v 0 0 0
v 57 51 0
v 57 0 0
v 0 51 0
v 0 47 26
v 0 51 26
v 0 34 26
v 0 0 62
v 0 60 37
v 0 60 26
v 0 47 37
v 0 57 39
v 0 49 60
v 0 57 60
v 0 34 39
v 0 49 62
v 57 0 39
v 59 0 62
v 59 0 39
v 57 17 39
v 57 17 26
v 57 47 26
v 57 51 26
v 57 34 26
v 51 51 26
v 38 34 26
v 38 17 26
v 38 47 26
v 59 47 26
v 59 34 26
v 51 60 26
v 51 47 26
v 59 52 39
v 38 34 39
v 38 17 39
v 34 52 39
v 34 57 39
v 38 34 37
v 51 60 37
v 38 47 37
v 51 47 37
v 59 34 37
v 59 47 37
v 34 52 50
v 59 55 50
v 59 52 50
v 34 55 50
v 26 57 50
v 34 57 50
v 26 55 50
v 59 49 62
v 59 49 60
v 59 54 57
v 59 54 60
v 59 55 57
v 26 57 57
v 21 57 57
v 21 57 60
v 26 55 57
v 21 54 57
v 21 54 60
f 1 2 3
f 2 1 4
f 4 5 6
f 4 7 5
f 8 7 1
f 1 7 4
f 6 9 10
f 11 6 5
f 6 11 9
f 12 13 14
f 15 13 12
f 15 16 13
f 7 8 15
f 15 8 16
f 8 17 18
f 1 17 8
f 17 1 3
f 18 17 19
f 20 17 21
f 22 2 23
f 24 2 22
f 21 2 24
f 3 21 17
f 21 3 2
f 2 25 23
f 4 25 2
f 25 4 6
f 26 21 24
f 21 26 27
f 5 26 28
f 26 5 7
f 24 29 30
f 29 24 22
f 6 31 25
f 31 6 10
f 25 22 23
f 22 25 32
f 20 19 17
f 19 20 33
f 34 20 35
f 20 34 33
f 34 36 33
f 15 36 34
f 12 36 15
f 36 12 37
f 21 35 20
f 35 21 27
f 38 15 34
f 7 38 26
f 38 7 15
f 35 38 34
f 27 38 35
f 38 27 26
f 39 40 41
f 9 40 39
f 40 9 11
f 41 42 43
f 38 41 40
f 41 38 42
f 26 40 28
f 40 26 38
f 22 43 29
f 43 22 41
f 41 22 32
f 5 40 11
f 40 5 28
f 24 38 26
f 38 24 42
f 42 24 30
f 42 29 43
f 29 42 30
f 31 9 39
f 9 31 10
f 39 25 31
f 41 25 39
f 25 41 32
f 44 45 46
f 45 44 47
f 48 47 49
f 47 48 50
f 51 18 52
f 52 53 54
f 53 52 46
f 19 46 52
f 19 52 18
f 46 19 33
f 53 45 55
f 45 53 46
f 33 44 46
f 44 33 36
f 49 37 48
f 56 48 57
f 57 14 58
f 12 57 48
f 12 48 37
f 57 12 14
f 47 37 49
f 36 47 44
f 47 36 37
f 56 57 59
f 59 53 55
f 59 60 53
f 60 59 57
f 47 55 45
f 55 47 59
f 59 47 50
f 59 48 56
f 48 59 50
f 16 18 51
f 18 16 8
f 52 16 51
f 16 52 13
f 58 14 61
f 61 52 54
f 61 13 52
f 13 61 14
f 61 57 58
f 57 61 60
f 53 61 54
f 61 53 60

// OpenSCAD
translate([9.5, 8.5, 6.5]) color([0.5739818030823766, 0.6271396891048426, 0.5313758038379728]) cube([19, 17, 13], center=true);
translate([28.5, 8.5, 6.5]) color([0.4108045023355995, 0.634594012376466, 0.40341287658681757]) cube([19, 17, 13], center=true);
translate([47.5, 8.5, 6.5]) color([0.7785502590540477, 0.7881774252549901, 0.29225416811082217]) cube([19, 17, 13], center=true);
translate([9.5, 25.5, 6.5]) color([0.37180432355577453, 0.6288109059468862, 0.15706996711565713]) cube([19, 17, 13], center=true);
translate([28.5, 25.5, 6.5]) color([0.6970319309869248, 0.3814277529807131, 0.591062474757007]) cube([19, 17, 13], center=true);
translate([47.5, 25.5, 6.5]) color([0.1395330992312218, 0.6682583860975598, 0.3540578606136997]) cube([19, 17, 13], center=true);
translate([9.5, 42.5, 6.5]) color([0.4726655762072315, 0.4151074008495357, 0.47671524799509457]) cube([19, 17, 13], center=true);
translate([28.5, 42.5, 6.5]) color([0.6946956329164442, 0.31824017683207795, 0.6520544808985483]) cube([19, 17, 13], center=true);
translate([47.5, 42.5, 6.5]) color([0.060222107499701916, 0.3001851524622099, 0.7452096901500458]) cube([19, 17, 13], center=true);
translate([9.5, 8.5, 19.5]) color([0.05240587806206365, 0.6211421952822352, 0.025546799267838538]) cube([19, 17, 13], center=true);
translate([28.5, 8.5, 19.5]) color([0.4715288683099005, 0.8885450437134765, 0.010110093997603875]) cube([19, 17, 13], center=true);
translate([47.5, 8.5, 19.5]) color([0.5268280206539229, 0.06645682965886301, 0.8671097761494883]) cube([19, 17, 13], center=true);
translate([9.5, 25.5, 19.5]) color([0.6862965222396646, 0.7419538566814291, 0.669007579945888]) cube([19, 17, 13], center=true);
translate([28.5, 25.5, 19.5]) color([0.006423453698145676, 0.041177862257898545, 0.6208768040220466]) cube([19, 17, 13], center=true);
translate([47.5, 25.5, 19.5]) color([0.9996851255769114, 0.8731472390917929, 0.699685806725371]) cube([19, 17, 13], center=true);
translate([9.5, 42.5, 19.5]) color([0.7270999543422898, 0.2266870226016624, 0.751613934135812]) cube([19, 17, 13], center=true);
translate([28.5, 42.5, 19.5]) color([0.28792410486343756, 0.10546026702239297, 0.4608948954667579]) cube([19, 17, 13], center=true);
translate([47.5, 42.5, 19.5]) color([0.33019577252961807, 0.168255398651179, 0.42170989251140467]) cube([19, 17, 13], center=true);
translate([9.5, 8.5, 32.5]) color([0.8972009769638755, 0.4352702732981688, 0.4472918952497248]) cube([19, 17, 13], center=true);
translate([28.5, 8.5, 32.5]) color([0.708827757444238, 0.5241618701522923, 0.12922303534199353]) cube([19, 17, 13], center=true);
translate([47.5, 8.5, 32.5]) color([0.91039239754397, 0.4441243361619651, 0.7893377392253591]) cube([19, 17, 13], center=true);
translate([9.5, 25.5, 32.5]) color([0.38887513002224416, 0.806846018820692, 0.3895364160074527]) cube([19, 17, 13], center=true);
translate([28.5, 25.5, 32.5]) color([0.2201595216660458, 0.19619466691666865, 0.9400346443375104]) cube([19, 17, 13], center=true);
translate([46.5, 40.5, 31.5]) color([0.58653025858102, 0.04979326505826487, 0.38834759617804915]) cube([17, 13, 11], center=true);
translate([57.0, 40.5, 31.5]) color([0.234029260524927, 0.08465706460929934, 0.18675586852140846]) cube([4, 13, 11], center=true);
translate([8.5, 53.5, 31.5]) color([0.05699047999950346, 0.6380736282281027, 0.17337386483746886]) cube([17, 13, 11], center=true);
translate([25.5, 53.5, 31.5]) color([0.6107798762435255, 0.6125067478912297, 0.7049237107399368]) cube([17, 13, 11], center=true);
translate([42.5, 53.5, 31.5]) color([0.5121186506114312, 0.28442399033479826, 0.8774574539285279]) cube([17, 13, 11], center=true);
translate([8.5, 6.5, 44.5]) color([0.35307108172351365, 0.4582943249787391, 0.6318794317305464]) cube([17, 13, 11], center=true);
translate([25.5, 6.5, 44.5]) color([0.5161242981674495, 0.9564683485665337, 0.9547176774381221]) cube([17, 13, 11], center=true);
translate([42.5, 6.5, 44.5]) color([0.9297598506094263, 0.9340763496652581, 0.580960135568696]) cube([17, 13, 11], center=true);
translate([55.0, 6.5, 44.5]) color([0.49020206373000297, 0.7041168173823689, 0.21541959298546798]) cube([8, 13, 11], center=true);
translate([8.5, 19.5, 44.5]) color([0.26587203921552827, 0.04380725363309168, 0.16285754255803098]) cube([17, 13, 11], center=true);
translate([25.5, 19.5, 44.5]) color([0.0038745499388105342, 0.6546275765234981, 0.14040698903568194]) cube([17, 13, 11], center=true);
translate([42.5, 19.5, 44.5]) color([0.7866793455760521, 0.680503995881725, 0.9706757933544957]) cube([17, 13, 11], center=true);
translate([55.0, 19.5, 44.5]) color([0.3965144869518913, 0.9213919134510528, 0.4537041723195332]) cube([8, 13, 11], center=true);
translate([8.5, 32.5, 44.5]) color([0.3395037398362071, 0.10233886991705377, 0.8828321850718597]) cube([17, 13, 11], center=true);
translate([25.5, 32.5, 44.5]) color([0.7947901585625868, 0.3229289765350606, 0.45574438492562896]) cube([17, 13, 11], center=true);
translate([42.5, 32.5, 44.5]) color([0.32514346581324827, 0.028829116538094723, 0.04435252539911694]) cube([17, 13, 11], center=true);
translate([55.0, 32.5, 44.5]) color([0.3687041258820589, 0.20959132812878367, 0.5245146032105923]) cube([8, 13, 11], center=true);
translate([8.5, 45.5, 44.5]) color([0.1877850356496189, 0.2016215864664097, 0.6726678813176303]) cube([17, 13, 11], center=true);
translate([25.5, 45.5, 44.5]) color([0.7356026567617159, 0.31223209587410494, 0.8599943994333726]) cube([17, 13, 11], center=true);
translate([42.5, 45.5, 44.5]) color([0.2546391746557106, 0.34394037628155716, 0.712480390369609]) cube([17, 13, 11], center=true);
translate([55.0, 45.5, 44.5]) color([0.04450290132920964, 0.934183460116191, 0.07233773178762537]) cube([8, 13, 11], center=true);
translate([8.5, 54.5, 44.5]) color([0.4609310589380602, 0.7246048259600892, 0.04746853498479808]) cube([17, 5, 11], center=true);
translate([25.5, 54.5, 44.5]) color([0.8090026856371774, 0.9788933433114139, 0.460511672795628]) cube([17, 5, 11], center=true);
translate([6.5, 5.5, 53.5]) color([0.11812363628756806, 0.08147699565547994, 0.09873043616313526]) cube([13, 11, 7], center=true);
translate([19.5, 5.5, 53.5]) color([0.7654413741364753, 0.4140128484685186, 0.9192341581990311]) cube([13, 11, 7], center=true);
translate([32.5, 5.5, 53.5]) color([0.4406397760864845, 0.07714331014460807, 0.42693558751800065]) cube([13, 11, 7], center=true);
translate([45.5, 5.5, 53.5]) color([0.7548278934255565, 0.8293384268467949, 0.039351686529191854]) cube([13, 11, 7], center=true);
translate([55.5, 5.5, 53.5]) color([0.1803893912563338, 0.490013452023644, 0.12808547795160863]) cube([7, 11, 7], center=true);
translate([6.5, 16.5, 53.5]) color([0.8710926419421733, 0.9344608884461488, 0.3195969983538176]) cube([13, 11, 7], center=true);
translate([19.5, 16.5, 53.5]) color([0.43484368255202, 0.5570540644200566, 0.2855057910835891]) cube([13, 11, 7], center=true);
translate([32.5, 16.5, 53.5]) color([0.5410756974595614, 0.2011850454737838, 0.2966412512769129]) cube([13, 11, 7], center=true);
translate([45.5, 16.5, 53.5]) color([0.44178363318767744, 0.604669902191143, 0.5361650260862432]) cube([13, 11, 7], center=true);
translate([55.5, 16.5, 53.5]) color([0.2609879767339395, 0.23178787541805523, 0.11873023670071103]) cube([7, 11, 7], center=true);
translate([6.5, 27.5, 53.5]) color([0.7834936358921726, 0.09890076646638046, 0.7328850061793606]) cube([13, 11, 7], center=true);
translate([19.5, 27.5, 53.5]) color([0.2487736956630997, 0.28455698400578255, 0.7360834330107994]) cube([13, 11, 7], center=true);
translate([32.5, 27.5, 53.5]) color([0.6596207917216363, 0.7419215555155583, 0.5152830587943614]) cube([13, 11, 7], center=true);
translate([45.5, 27.5, 53.5]) color([0.8590958196652707, 0.12179389137547159, 0.6451969614065052]) cube([13, 11, 7], center=true);
translate([55.5, 27.5, 53.5]) color([0.11824431248865597, 0.7372833681454282, 0.3589046614584527]) cube([7, 11, 7], center=true);
translate([6.5, 38.5, 53.5]) color([0.67488210437111, 0.7034839134412817, 0.6606084576410584]) cube([13, 11, 7], center=true);
translate([19.5, 38.5, 53.5]) color([0.22155798032782648, 0.8317998863873537, 0.24013608742346748]) cube([13, 11, 7], center=true);
translate([32.5, 38.5, 53.5]) color([0.5181532972121122, 0.6746457541533513, 0.23360317478475656]) cube([13, 11, 7], center=true);
translate([45.5, 38.5, 53.5]) color([0.628511722983939, 0.2868310479973286, 0.1713823760843869]) cube([13, 11, 7], center=true);
translate([55.5, 38.5, 53.5]) color([0.809748828526577, 0.5531227700773604, 0.32788470660885605]) cube([7, 11, 7], center=true);
translate([6.5, 49.5, 53.5]) color([0.5854309472055399, 0.025286397427288332, 0.12982285676032723]) cube([13, 11, 7], center=true);
translate([19.5, 49.5, 53.5]) color([0.3955808516982431, 0.9757565794644123, 0.5104745178761232]) cube([13, 11, 7], center=true);
translate([32.5, 49.5, 53.5]) color([0.07645620506689521, 0.7650406152494567, 0.7814438709253152]) cube([13, 11, 7], center=true);
translate([45.5, 49.5, 53.5]) color([0.7748021743948562, 0.5694980380479538, 0.6956987378694627]) cube([13, 11, 7], center=true);
translate([55.5, 49.5, 53.5]) color([0.21345793631163135, 0.7325605908939883, 0.8161739873415944]) cube([7, 11, 7], center=true);
translate([6.5, 56.0, 53.5]) color([0.7599665402219192, 0.353462402585887, 0.5910280505757086]) cube([13, 2, 7], center=true);
translate([19.5, 56.0, 53.5]) color([0.6289893574898388, 0.9008098536570839, 0.1080138952733335]) cube([13, 2, 7], center=true);
translate([5.5, 3.5, 59.5]) color([0.8339337708504084, 0.5264355584690392, 0.3586141205519373]) cube([11, 7, 5], center=true);
translate([16.5, 3.5, 59.5]) color([0.4556029014937524, 0.012635498930738787, 0.22007359233142765]) cube([11, 7, 5], center=true);
translate([27.5, 3.5, 59.5]) color([0.6527634200680049, 0.660849279754449, 0.4946989402863131]) cube([11, 7, 5], center=true);
translate([38.5, 3.5, 59.5]) color([0.9533258805973196, 0.4809150885494712, 0.3139436595456605]) cube([11, 7, 5], center=true);
translate([49.5, 3.5, 59.5]) color([0.8477808391956414, 0.259158299397262, 0.6043059930343495]) cube([11, 7, 5], center=true);
translate([57.0, 3.5, 59.5]) color([0.7034188523223, 0.8216962986917842, 0.7853687501827489]) cube([4, 7, 5], center=true);
translate([5.5, 10.5, 59.5]) color([0.3840923305137113, 0.059180305962736934, 0.03828786548344276]) cube([11, 7, 5], center=true);
translate([16.5, 10.5, 59.5]) color([0.7264603879084595, 0.9616913814068508, 0.3431653742712939]) cube([11, 7, 5], center=true);
translate([27.5, 10.5, 59.5]) color([0.44119509807551416, 0.7257980157417766, 0.6578312458538799]) cube([11, 7, 5], center=true);
translate([38.5, 10.5, 59.5]) color([0.26010658848413604, 0.6715848457987025, 0.3049024195743838]) cube([11, 7, 5], center=true);
translate([49.5, 10.5, 59.5]) color([0.3563579065620385, 0.5395133052630944, 0.7323138239267305]) cube([11, 7, 5], center=true);
translate([57.0, 10.5, 59.5]) color([0.15121621156796483, 0.021987210892938758, 0.6278299544850219]) cube([4, 7, 5], center=true);
translate([5.5, 17.5, 59.5]) color([0.024564677785836264, 0.04496324071616853, 0.22577557672213355]) cube([11, 7, 5], center=true);
translate([16.5, 17.5, 59.5]) color([0.6538768733044555, 0.06654509768602879, 0.06240576762652772]) cube([11, 7, 5], center=true);
translate([27.5, 17.5, 59.5]) color([0.9720932443736168, 0.4226528937805498, 0.8924289339928592]) cube([11, 7, 5], center=true);
translate([38.5, 17.5, 59.5]) color([0.21652428395276402, 0.4352131794546169, 0.35803513461315506]) cube([11, 7, 5], center=true);
translate([49.5, 17.5, 59.5]) color([0.17693553603496914, 0.32881318575191665, 0.9867958186960467]) cube([11, 7, 5], center=true);
translate([57.0, 17.5, 59.5]) color([0.7473090097951195, 0.3826682791831585, 0.40928443439993156]) cube([4, 7, 5], center=true);
translate([5.5, 24.5, 59.5]) color([0.2637409011550663, 0.531336678598825, 0.7356369121419466]) cube([11, 7, 5], center=true);
translate([16.5, 24.5, 59.5]) color([0.686646615750601, 0.46264983534131954, 0.041939046716157]) cube([11, 7, 5], center=true);
translate([27.5, 24.5, 59.5]) color([0.9215078064992686, 0.4089338030960661, 0.3902988670119316]) cube([11, 7, 5], center=true);
translate([38.5, 24.5, 59.5]) color([0.0031101144891549914, 0.13822721408191307, 0.8688534175006787]) cube([11, 7, 5], center=true);
translate([49.5, 24.5, 59.5]) color([0.513934596181303, 0.7324348442226767, 0.14816788643335854]) cube([11, 7, 5], center=true);
translate([57.0, 24.5, 59.5]) color([0.33005100665524945, 0.8401365565378639, 0.8206585211774247]) cube([4, 7, 5], center=true);
translate([5.5, 31.5, 59.5]) color([0.2467942680862406, 0.021975308333072263, 0.8064669735456029]) cube([11, 7, 5], center=true);
translate([16.5, 31.5, 59.5]) color([0.16884400503942165, 0.7876813921208954, 0.6836592298851071]) cube([11, 7, 5], center=true);
translate([27.5, 31.5, 59.5]) color([0.1683147603108942, 0.0784886436699127, 0.9276494299222889]) cube([11, 7, 5], center=true);
translate([38.5, 31.5, 59.5]) color([0.5978783972833935, 0.620510173056511, 0.4575118028380537]) cube([11, 7, 5], center=true);
translate([49.5, 31.5, 59.5]) color([0.15007097732228858, 0.6019699129465877, 0.2524728800375037]) cube([11, 7, 5], center=true);
translate([57.0, 31.5, 59.5]) color([0.8058946560175415, 0.732718954805416, 0.027267185045511733]) cube([4, 7, 5], center=true);
translate([5.5, 38.5, 59.5]) color([0.9324230096450348, 0.03631604832667812, 0.0896193188307074]) cube([11, 7, 5], center=true);
translate([16.5, 38.5, 59.5]) color([0.2927345609042453, 0.1508090604701401, 0.2361450829166024]) cube([11, 7, 5], center=true);
translate([27.5, 38.5, 59.5]) color([0.3558094886115547, 0.7354997154547138, 0.4047113607648444]) cube([11, 7, 5], center=true);
translate([38.5, 38.5, 59.5]) color([0.2698397547254259, 0.4923131536276696, 0.39259324978876053]) cube([11, 7, 5], center=true);
translate([49.5, 38.5, 59.5]) color([0.310764197486207, 0.900541657866744, 0.5504484509596044]) cube([11, 7, 5], center=true);
translate([57.0, 38.5, 59.5]) color([0.9773275109747672, 0.7729124093934382, 0.570499297619577]) cube([4, 7, 5], center=true);
translate([5.5, 45.5, 59.5]) color([0.26244658927686404, 0.6868436562888387, 0.45591771896977173]) cube([11, 7, 5], center=true);
translate([16.5, 45.5, 59.5]) color([0.7213877150417534, 0.40377880891106155, 0.49600503631794757]) cube([11, 7, 5], center=true);
translate([27.5, 45.5, 59.5]) color([0.02068376744575562, 0.739958502320053, 0.03427354435563068]) cube([11, 7, 5], center=true);
translate([38.5, 45.5, 59.5]) color([0.6807253858476396, 0.5820036955379622, 0.7759176114881267]) cube([11, 7, 5], center=true);
translate([49.5, 45.5, 59.5]) color([0.28977759923741564, 0.6861108151233298, 0.20709797563103816]) cube([11, 7, 5], center=true);
translate([57.0, 45.5, 59.5]) color([0.5292720013578311, 0.34028037925118015, 0.9784545513570129]) cube([4, 7, 5], center=true);
translate([3.5, 51.5, 58.5]) color([0.9718665573793185, 0.20896973547336006, 0.5660382358858294]) cube([7, 5, 3], center=true);
translate([10.5, 51.5, 58.5]) color([0.3294426858782725, 0.9685381870202809, 0.9245259481865659]) cube([7, 5, 3], center=true);
translate([17.5, 51.5, 58.5]) color([0.5861458530564896, 0.7200844551084937, 0.6813247567090696]) cube([7, 5, 3], center=true);
translate([24.5, 51.5, 58.5]) color([0.353355632443361, 0.91636156937516, 0.899453536816357]) cube([7, 5, 3], center=true);
translate([31.5, 51.5, 58.5]) color([0.33065846447807934, 0.7473949106043586, 0.009092126674448586]) cube([7, 5, 3], center=true);
translate([38.5, 51.5, 58.5]) color([0.8163591105584419, 0.5648693453979996, 0.9523067127509502]) cube([7, 5, 3], center=true);
translate([45.5, 51.5, 58.5]) color([0.3631930745481745, 0.6257130749033707, 0.3230024315033787]) cube([7, 5, 3], center=true);
translate([52.5, 51.5, 58.5]) color([0.7827853814039997, 0.6007029967830003, 0.9874710229786893]) cube([7, 5, 3], center=true);
translate([57.5, 51.5, 58.5]) color([0.0010127930964535237, 0.14075874215813544, 0.043601382090813434]) cube([3, 5, 3], center=true);
translate([3.5, 55.5, 58.5]) color([0.1258478488128345, 0.9293852970698306, 0.9486082995058949]) cube([7, 3, 3], center=true);
translate([10.5, 55.5, 58.5]) color([0.4804125346981437, 0.9466893945947962, 0.818387610188399]) cube([7, 3, 3], center=true);
translate([17.5, 55.5, 58.5]) color([0.7786177341461099, 0.747281950803196, 0.18765458516959888]) cube([7, 3, 3], center=true);
